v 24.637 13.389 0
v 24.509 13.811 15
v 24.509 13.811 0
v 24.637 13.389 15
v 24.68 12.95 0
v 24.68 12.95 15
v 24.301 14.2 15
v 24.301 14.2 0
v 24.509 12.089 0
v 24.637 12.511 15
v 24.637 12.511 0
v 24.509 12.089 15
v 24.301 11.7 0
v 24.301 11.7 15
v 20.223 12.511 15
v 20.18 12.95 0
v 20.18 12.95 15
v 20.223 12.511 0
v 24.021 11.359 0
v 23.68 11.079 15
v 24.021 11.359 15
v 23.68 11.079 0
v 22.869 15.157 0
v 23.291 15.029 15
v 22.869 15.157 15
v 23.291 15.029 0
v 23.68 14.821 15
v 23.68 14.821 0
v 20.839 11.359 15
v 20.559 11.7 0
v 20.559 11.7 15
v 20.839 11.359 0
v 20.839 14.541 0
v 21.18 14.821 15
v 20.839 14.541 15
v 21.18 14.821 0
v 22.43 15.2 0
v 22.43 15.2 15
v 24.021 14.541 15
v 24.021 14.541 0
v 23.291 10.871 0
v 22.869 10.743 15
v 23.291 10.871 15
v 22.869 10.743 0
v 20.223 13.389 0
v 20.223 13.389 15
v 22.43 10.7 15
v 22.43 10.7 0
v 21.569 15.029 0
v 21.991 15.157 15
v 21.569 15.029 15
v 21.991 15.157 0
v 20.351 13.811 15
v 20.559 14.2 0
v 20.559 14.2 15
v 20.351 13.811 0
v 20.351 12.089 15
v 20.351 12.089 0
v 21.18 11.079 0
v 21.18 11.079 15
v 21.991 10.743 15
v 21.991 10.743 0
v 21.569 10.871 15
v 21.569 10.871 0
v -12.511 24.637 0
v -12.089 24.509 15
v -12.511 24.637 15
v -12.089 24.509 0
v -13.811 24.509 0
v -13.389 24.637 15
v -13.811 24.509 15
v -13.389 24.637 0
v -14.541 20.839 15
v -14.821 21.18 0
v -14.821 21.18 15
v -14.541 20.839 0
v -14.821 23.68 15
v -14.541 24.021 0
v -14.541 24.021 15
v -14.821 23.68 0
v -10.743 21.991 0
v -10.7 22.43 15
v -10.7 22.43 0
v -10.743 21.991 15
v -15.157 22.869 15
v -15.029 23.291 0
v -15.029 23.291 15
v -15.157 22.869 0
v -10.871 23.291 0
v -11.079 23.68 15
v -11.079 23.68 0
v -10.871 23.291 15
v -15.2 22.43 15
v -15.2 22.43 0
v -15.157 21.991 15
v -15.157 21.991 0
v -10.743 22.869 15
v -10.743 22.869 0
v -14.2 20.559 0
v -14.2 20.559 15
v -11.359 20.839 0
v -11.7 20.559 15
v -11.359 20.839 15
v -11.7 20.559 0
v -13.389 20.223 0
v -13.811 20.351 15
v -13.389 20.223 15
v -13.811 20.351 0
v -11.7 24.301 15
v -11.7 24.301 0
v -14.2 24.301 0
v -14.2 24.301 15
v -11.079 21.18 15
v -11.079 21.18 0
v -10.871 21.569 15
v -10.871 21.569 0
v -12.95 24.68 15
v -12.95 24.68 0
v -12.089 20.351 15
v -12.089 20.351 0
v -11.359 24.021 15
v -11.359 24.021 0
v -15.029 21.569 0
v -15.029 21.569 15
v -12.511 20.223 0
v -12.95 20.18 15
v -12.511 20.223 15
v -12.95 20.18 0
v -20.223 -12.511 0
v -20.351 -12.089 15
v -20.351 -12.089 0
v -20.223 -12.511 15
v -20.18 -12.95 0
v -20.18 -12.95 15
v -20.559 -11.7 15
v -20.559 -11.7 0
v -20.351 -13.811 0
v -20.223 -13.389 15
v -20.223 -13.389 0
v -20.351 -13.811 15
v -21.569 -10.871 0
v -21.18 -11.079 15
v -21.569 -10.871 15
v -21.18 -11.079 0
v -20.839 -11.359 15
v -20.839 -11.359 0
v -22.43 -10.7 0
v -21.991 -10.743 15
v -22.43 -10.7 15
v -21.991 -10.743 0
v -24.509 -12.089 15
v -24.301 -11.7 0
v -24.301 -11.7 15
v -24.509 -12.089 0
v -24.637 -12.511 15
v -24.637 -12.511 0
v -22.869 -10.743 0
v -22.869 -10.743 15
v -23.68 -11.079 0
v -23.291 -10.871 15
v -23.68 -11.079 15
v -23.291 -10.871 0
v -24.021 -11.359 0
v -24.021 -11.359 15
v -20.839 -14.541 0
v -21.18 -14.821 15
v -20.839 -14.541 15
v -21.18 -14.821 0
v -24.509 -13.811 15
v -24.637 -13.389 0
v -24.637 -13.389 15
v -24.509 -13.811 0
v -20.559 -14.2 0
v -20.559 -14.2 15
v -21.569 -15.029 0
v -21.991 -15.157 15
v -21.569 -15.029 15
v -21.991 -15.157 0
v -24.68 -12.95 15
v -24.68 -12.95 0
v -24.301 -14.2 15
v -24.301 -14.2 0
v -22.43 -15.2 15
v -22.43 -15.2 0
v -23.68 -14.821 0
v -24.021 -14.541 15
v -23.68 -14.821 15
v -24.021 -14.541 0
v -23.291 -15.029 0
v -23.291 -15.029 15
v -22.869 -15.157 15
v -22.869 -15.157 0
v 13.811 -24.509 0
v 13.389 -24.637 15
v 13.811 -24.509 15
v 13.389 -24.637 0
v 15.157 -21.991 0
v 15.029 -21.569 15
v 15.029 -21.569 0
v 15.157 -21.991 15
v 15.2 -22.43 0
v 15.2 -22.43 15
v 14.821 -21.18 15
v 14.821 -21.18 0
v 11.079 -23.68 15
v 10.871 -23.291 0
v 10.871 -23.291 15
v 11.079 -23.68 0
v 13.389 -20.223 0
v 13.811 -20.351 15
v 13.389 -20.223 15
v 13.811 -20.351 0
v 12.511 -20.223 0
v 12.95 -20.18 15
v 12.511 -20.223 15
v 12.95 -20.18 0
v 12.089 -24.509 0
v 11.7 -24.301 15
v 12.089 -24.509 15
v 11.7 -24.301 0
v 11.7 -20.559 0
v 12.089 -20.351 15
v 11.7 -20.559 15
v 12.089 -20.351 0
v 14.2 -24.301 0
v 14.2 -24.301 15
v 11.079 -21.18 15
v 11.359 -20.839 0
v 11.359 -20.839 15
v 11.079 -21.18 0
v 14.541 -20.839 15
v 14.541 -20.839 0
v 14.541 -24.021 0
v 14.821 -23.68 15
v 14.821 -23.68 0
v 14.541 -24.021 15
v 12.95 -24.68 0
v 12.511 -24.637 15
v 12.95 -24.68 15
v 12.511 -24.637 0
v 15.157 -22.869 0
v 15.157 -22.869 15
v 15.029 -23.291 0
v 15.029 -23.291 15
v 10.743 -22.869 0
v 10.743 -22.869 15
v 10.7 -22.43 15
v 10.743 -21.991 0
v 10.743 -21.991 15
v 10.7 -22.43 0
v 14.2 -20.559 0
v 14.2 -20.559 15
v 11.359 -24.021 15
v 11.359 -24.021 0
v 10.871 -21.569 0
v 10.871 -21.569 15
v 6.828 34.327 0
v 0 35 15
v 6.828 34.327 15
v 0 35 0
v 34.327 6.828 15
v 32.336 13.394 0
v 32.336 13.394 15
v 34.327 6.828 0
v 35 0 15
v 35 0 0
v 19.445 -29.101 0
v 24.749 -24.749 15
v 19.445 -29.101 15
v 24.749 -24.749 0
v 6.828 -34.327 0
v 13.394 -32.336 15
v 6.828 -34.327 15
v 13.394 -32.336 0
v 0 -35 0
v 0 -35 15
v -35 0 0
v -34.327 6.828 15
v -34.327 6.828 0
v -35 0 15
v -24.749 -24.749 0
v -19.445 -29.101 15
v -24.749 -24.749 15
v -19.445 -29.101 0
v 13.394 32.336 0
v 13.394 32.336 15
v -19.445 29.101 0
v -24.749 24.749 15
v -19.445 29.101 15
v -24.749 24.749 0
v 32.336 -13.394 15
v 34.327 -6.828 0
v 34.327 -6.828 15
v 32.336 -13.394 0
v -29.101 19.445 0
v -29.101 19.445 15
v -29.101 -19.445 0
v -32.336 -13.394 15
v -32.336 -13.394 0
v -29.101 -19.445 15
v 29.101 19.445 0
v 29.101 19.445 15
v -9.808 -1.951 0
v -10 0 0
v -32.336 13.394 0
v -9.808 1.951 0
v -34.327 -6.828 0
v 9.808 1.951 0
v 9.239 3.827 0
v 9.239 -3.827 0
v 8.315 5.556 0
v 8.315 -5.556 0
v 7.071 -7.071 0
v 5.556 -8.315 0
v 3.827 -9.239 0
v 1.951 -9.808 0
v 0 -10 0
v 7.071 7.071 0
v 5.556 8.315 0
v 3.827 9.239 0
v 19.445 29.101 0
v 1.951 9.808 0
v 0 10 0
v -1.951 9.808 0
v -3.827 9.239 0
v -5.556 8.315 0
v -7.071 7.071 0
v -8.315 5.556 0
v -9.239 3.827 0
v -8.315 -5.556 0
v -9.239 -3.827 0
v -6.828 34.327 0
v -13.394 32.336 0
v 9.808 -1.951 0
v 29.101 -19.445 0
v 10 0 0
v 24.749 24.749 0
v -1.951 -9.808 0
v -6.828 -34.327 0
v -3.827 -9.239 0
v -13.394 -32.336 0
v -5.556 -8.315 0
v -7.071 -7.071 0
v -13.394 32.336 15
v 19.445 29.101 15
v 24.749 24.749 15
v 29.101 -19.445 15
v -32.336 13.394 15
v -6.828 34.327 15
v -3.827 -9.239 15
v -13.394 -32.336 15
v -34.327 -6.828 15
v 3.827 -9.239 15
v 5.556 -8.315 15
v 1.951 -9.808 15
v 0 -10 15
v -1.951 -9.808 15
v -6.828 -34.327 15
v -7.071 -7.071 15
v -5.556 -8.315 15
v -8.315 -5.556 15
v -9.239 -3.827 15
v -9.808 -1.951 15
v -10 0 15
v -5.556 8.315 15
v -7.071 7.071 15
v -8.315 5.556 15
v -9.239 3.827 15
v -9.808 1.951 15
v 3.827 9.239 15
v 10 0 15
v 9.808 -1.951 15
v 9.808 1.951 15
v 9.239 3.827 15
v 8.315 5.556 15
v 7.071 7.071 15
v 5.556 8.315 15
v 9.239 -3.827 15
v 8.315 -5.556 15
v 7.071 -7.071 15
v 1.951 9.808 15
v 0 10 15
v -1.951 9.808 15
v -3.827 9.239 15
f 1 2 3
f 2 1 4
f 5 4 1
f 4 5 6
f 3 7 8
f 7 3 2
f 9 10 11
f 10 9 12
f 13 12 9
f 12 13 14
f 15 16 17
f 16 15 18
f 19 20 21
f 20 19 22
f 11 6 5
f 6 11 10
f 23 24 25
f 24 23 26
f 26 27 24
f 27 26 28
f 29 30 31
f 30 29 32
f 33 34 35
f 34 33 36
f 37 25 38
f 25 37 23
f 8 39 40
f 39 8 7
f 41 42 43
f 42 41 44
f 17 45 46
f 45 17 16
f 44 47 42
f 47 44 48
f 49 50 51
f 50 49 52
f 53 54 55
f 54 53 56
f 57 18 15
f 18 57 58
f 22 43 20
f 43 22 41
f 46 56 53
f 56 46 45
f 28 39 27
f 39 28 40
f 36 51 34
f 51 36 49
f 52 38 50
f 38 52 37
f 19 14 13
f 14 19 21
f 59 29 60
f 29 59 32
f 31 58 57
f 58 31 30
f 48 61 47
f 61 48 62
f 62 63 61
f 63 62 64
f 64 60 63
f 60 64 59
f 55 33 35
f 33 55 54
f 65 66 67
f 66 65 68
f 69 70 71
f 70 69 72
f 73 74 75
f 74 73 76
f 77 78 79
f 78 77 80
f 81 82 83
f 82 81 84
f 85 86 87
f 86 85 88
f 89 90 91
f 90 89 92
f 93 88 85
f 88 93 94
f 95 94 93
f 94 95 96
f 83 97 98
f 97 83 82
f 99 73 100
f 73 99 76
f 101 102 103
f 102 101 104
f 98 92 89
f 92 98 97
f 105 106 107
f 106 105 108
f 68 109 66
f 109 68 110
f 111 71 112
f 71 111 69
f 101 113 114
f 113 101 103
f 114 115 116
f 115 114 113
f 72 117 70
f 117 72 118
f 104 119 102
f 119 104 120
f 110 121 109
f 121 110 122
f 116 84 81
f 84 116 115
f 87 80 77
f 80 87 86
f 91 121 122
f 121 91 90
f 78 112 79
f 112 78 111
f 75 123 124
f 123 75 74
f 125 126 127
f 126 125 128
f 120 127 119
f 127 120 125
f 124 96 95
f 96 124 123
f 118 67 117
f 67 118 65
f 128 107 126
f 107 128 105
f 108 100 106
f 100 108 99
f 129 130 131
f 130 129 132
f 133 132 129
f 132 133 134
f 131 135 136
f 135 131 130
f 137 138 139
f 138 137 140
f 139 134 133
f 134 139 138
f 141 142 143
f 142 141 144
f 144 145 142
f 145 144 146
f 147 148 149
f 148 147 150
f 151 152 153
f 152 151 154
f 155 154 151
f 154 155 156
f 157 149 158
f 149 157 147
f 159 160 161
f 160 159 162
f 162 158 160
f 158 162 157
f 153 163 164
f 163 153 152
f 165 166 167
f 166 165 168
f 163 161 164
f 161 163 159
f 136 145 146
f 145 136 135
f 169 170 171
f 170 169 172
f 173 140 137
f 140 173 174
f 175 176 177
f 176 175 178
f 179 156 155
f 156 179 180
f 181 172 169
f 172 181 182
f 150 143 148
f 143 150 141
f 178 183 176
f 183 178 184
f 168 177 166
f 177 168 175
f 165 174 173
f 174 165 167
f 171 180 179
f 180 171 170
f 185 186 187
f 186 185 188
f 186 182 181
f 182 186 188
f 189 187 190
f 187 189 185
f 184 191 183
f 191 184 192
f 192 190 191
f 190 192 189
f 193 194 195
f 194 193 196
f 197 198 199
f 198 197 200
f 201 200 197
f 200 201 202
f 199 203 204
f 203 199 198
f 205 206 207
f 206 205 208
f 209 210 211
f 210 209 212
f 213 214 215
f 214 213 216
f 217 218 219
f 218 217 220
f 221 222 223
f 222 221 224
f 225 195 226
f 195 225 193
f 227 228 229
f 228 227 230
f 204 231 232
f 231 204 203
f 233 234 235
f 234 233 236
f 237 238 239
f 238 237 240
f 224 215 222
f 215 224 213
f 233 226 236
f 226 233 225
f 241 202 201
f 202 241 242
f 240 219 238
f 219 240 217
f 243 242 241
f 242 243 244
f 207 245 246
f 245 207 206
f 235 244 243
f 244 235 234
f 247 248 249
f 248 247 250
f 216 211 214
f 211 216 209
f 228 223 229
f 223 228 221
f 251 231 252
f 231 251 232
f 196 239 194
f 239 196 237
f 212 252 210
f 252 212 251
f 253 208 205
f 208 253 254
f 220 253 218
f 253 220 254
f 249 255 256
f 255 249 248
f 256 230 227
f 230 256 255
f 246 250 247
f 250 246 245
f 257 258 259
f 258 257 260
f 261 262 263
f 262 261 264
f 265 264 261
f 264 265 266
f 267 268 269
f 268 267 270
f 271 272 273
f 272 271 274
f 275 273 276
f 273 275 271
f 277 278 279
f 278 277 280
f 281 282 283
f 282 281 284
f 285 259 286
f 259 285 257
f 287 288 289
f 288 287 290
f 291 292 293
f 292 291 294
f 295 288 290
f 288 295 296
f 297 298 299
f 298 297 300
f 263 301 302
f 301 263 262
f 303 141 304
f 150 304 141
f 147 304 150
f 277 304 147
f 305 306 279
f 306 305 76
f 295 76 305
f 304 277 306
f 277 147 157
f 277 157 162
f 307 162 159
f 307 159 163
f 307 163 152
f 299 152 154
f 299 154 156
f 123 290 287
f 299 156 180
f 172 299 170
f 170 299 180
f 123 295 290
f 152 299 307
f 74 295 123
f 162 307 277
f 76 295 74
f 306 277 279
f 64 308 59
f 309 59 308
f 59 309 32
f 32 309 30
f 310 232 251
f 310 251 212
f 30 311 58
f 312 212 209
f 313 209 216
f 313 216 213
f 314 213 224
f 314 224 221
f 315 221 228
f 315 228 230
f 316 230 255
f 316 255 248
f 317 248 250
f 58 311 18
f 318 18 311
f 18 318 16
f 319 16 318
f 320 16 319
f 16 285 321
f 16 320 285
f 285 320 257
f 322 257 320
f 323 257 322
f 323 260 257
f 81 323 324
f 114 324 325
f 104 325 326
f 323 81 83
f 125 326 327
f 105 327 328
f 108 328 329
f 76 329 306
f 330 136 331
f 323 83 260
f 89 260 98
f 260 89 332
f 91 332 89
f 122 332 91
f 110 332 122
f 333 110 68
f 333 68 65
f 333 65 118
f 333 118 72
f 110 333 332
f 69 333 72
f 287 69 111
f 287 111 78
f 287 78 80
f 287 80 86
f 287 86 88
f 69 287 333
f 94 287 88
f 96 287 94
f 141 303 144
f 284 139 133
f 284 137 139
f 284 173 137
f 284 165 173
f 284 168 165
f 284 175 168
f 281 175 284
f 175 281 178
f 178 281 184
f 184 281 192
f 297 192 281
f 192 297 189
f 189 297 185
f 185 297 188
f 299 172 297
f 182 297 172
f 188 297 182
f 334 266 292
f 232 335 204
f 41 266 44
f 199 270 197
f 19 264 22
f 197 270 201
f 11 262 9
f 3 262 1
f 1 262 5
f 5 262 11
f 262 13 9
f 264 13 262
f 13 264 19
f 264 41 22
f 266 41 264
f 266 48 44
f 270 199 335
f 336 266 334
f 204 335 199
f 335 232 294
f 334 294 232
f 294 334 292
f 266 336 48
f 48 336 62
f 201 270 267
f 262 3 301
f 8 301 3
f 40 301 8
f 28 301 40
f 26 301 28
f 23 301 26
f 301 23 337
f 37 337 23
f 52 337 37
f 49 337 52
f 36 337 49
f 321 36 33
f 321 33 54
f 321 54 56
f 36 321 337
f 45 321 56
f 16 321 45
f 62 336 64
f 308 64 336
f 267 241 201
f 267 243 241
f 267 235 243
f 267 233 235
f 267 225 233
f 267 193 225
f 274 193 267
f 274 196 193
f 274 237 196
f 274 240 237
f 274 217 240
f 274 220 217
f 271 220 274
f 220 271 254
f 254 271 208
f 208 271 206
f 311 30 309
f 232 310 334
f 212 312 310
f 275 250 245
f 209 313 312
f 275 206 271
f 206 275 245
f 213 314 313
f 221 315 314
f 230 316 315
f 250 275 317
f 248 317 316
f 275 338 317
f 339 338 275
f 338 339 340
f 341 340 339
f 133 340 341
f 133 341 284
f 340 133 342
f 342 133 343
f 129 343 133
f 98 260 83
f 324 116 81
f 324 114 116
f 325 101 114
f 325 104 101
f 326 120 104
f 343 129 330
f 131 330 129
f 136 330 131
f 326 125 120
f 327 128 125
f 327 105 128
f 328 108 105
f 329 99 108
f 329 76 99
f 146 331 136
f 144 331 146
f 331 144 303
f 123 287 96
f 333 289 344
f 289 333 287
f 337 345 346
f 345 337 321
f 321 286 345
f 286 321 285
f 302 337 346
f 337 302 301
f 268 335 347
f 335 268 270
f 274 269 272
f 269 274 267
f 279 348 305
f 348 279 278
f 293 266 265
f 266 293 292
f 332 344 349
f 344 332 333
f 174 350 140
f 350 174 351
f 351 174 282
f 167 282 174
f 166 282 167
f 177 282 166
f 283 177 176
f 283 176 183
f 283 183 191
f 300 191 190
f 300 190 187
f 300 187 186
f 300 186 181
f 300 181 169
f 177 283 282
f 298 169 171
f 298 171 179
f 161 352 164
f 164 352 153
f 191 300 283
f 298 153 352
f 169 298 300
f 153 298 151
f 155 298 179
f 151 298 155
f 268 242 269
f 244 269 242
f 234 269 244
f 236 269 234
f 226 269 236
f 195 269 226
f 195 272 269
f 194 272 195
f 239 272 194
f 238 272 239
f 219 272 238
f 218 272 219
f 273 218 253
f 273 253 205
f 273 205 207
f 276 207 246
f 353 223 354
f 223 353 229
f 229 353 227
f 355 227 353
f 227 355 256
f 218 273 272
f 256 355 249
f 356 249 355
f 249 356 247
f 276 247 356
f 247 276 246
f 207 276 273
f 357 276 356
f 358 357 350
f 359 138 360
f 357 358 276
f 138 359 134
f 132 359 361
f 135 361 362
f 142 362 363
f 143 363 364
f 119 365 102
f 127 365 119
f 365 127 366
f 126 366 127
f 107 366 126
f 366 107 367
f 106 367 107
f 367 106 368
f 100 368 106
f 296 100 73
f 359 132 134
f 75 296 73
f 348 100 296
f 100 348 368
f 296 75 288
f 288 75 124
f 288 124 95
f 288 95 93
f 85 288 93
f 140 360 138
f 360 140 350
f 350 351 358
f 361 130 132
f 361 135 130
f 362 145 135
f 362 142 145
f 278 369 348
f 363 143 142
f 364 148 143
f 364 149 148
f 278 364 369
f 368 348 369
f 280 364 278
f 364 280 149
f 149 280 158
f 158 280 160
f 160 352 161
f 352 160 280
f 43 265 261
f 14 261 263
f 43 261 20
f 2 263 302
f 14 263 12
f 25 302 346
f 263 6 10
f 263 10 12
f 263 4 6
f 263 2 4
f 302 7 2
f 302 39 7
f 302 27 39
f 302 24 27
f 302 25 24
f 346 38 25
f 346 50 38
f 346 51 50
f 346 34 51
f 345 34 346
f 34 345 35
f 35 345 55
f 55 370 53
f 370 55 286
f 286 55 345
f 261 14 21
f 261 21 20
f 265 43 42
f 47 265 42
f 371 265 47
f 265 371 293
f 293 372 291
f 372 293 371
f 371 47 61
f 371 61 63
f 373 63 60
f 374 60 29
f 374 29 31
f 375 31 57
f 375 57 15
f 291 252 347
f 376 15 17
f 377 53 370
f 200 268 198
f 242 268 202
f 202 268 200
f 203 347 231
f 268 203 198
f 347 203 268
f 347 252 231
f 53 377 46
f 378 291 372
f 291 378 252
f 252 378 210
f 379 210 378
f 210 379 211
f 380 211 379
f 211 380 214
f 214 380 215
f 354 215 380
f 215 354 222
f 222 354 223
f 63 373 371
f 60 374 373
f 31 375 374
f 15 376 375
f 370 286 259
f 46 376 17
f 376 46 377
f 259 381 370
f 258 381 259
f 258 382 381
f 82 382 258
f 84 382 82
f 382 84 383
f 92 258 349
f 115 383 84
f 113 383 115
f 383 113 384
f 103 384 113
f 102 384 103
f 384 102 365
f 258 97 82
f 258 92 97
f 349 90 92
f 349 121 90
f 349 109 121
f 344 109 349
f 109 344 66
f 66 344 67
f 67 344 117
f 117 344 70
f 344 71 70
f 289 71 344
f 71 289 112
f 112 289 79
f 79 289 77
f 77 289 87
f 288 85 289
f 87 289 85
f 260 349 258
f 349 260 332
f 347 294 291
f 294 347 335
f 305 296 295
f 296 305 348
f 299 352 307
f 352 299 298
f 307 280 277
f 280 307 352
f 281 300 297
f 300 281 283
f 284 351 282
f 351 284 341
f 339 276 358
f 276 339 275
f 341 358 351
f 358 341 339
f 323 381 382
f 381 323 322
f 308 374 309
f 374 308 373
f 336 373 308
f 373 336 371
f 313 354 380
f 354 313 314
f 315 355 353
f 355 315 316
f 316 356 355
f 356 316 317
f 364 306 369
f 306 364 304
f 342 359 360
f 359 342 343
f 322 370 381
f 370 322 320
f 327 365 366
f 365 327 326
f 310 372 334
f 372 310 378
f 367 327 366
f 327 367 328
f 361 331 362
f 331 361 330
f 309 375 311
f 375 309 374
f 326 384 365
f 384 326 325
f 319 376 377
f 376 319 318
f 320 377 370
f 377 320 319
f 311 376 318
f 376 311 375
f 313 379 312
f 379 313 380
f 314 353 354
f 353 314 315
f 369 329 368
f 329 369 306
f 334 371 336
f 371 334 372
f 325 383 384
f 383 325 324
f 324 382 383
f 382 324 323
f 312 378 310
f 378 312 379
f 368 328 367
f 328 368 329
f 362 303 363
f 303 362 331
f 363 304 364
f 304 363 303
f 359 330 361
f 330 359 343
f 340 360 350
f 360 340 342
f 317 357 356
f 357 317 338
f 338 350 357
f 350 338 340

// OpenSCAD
$fn = 32;

// ----------------------------------------------------------------------
// Flange Ø70 x 15
// 4 holes on a Ø51.8 bolt circle, bolted joints
// ----------------------------------------------------------------------

// --- parameters (mm) ---
flange_d = 70;   // outside diameter of the flange
thickness = 15;  // flange thickness
holes = 4;       // number of bolt holes
pcd = 51.8;      // bolt circle diameter
start_deg = 30;  // angle of the first hole, from +X
hole_d = 4.5;    // bolt hole diameter
bore_d = 20;     // central through bore
hub_d = 32;      // hub outside diameter
hub_h = 0;       // hub height above the flange face (0 = no hub)

// --- derived feature positions (mm) ---
height = thickness + hub_h;  // = 15   overall height of the part
pcd_r = pcd / 2;             // = 25.9   bolt circle radius
hole_step = 360 / holes;     // = 90   angular pitch
feature_centers = [
  [pcd_r * cos(start_deg + 0 * hole_step), pcd_r * sin(start_deg + 0 * hole_step)],
  [pcd_r * cos(start_deg + 1 * hole_step), pcd_r * sin(start_deg + 1 * hole_step)],
  [pcd_r * cos(start_deg + 2 * hole_step), pcd_r * sin(start_deg + 2 * hole_step)],
  [pcd_r * cos(start_deg + 3 * hole_step), pcd_r * sin(start_deg + 3 * hole_step)]
];   // bolt hole centres on the pitch circle

// flange disc, every hole and the bore cut straight through
difference() {
  union() {
    cylinder(d = flange_d, h = thickness);
  }
  translate([0, 0, -1]) cylinder(d = bore_d, h = height + 2);  // bore, through
  for (centre = feature_centers)
    translate([centre[0], centre[1], -1]) cylinder(d = hole_d, h = thickness + 2);
}
